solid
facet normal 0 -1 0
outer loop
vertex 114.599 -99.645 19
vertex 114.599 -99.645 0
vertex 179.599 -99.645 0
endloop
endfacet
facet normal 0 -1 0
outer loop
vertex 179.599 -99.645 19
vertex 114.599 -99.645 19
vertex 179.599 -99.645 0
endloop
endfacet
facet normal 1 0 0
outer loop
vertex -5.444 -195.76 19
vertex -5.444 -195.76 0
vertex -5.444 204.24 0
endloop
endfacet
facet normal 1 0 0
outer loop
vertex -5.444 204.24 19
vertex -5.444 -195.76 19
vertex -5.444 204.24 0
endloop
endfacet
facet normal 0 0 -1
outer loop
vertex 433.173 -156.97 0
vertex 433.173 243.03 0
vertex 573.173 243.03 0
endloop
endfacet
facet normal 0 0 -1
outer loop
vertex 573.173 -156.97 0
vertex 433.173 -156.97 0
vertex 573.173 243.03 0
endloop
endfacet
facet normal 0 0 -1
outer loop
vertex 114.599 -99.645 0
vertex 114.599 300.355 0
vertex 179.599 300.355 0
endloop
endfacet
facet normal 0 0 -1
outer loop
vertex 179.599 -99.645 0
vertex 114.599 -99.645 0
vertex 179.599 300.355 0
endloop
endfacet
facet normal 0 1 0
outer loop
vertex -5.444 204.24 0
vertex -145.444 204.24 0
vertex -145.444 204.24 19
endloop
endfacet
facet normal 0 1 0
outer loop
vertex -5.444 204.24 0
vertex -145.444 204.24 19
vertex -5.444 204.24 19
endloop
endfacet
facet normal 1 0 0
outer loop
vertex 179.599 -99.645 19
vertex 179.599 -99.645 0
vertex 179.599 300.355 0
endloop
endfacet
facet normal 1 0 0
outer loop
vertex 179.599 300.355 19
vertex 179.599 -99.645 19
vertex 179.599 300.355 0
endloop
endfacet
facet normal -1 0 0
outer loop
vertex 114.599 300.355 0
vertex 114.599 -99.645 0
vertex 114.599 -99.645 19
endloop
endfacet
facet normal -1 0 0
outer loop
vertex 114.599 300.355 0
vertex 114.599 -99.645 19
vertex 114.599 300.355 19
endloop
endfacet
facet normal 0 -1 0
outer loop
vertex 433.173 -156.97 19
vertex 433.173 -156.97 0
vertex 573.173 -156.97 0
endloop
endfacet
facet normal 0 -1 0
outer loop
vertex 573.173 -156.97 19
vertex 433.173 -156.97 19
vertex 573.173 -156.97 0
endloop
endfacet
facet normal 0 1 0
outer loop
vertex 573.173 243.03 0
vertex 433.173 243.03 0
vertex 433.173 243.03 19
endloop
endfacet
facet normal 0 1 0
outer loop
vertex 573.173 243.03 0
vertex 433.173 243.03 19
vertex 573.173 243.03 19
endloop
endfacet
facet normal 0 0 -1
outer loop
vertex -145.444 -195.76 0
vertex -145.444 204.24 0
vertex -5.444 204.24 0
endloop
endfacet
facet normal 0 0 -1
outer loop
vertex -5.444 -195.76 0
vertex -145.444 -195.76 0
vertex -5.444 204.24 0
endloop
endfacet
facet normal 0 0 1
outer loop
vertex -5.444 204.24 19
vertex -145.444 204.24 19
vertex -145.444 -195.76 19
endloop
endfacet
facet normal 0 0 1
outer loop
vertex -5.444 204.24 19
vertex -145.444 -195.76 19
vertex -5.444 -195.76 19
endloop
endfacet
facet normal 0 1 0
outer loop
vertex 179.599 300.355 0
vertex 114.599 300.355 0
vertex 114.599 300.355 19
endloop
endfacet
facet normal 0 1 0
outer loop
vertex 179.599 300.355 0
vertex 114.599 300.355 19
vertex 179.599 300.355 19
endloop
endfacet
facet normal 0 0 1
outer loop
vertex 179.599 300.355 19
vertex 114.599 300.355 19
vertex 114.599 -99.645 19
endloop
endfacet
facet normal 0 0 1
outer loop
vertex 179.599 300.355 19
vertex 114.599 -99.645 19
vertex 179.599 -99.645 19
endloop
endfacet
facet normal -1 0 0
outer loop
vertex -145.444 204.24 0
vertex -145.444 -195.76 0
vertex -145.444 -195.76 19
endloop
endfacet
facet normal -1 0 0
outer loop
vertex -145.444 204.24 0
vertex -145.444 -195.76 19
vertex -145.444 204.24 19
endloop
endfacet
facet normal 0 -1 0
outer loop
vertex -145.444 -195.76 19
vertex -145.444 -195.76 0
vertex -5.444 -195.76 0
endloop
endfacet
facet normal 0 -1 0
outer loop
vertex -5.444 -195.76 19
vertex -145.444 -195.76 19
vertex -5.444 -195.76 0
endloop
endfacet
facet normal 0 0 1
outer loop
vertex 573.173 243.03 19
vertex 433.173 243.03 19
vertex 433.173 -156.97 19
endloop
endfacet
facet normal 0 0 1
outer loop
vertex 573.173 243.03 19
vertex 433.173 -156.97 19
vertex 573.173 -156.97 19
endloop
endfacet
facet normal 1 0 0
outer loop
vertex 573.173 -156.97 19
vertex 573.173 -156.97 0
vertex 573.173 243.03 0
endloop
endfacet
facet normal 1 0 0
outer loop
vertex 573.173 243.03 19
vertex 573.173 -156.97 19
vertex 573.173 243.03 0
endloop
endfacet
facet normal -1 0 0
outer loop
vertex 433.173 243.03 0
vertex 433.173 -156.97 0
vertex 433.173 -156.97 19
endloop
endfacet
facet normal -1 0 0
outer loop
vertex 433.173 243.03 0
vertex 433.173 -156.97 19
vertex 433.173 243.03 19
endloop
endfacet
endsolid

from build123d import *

# Parameters (mm, degrees)
F0_W     = 140
F0_H     = 400
F1_DEPTH = 19
F2_W     = 140
F2_H     = 400
F3_DEPTH = 19
F4_W     = 65
F4_H     = 400
F5_DEPTH = 19


with BuildPart() as f1:
    # F0 (on Top) → F1 (new body)
    with BuildSketch(Plane.XY):
        with Locations((-75.443525, 4.240409)):
            Rectangle(F0_W, F0_H)
    extrude(amount=F1_DEPTH)


with BuildPart() as f3:
    # F2 (on Top) → F3 (new body)
    with BuildSketch(Plane.XY):
        with Locations((503.172904, 43.029861)):
            Rectangle(F2_W, F2_H)
    extrude(amount=F3_DEPTH)


with BuildPart() as f5:
    # F4 (on Top) → F5 (new body)
    with BuildSketch(Plane.XY):
        with Locations((147.098945, 100.355213)):
            Rectangle(F4_W, F4_H)
    extrude(amount=F5_DEPTH)


solid = Compound([f1.part, f3.part, f5.part])
